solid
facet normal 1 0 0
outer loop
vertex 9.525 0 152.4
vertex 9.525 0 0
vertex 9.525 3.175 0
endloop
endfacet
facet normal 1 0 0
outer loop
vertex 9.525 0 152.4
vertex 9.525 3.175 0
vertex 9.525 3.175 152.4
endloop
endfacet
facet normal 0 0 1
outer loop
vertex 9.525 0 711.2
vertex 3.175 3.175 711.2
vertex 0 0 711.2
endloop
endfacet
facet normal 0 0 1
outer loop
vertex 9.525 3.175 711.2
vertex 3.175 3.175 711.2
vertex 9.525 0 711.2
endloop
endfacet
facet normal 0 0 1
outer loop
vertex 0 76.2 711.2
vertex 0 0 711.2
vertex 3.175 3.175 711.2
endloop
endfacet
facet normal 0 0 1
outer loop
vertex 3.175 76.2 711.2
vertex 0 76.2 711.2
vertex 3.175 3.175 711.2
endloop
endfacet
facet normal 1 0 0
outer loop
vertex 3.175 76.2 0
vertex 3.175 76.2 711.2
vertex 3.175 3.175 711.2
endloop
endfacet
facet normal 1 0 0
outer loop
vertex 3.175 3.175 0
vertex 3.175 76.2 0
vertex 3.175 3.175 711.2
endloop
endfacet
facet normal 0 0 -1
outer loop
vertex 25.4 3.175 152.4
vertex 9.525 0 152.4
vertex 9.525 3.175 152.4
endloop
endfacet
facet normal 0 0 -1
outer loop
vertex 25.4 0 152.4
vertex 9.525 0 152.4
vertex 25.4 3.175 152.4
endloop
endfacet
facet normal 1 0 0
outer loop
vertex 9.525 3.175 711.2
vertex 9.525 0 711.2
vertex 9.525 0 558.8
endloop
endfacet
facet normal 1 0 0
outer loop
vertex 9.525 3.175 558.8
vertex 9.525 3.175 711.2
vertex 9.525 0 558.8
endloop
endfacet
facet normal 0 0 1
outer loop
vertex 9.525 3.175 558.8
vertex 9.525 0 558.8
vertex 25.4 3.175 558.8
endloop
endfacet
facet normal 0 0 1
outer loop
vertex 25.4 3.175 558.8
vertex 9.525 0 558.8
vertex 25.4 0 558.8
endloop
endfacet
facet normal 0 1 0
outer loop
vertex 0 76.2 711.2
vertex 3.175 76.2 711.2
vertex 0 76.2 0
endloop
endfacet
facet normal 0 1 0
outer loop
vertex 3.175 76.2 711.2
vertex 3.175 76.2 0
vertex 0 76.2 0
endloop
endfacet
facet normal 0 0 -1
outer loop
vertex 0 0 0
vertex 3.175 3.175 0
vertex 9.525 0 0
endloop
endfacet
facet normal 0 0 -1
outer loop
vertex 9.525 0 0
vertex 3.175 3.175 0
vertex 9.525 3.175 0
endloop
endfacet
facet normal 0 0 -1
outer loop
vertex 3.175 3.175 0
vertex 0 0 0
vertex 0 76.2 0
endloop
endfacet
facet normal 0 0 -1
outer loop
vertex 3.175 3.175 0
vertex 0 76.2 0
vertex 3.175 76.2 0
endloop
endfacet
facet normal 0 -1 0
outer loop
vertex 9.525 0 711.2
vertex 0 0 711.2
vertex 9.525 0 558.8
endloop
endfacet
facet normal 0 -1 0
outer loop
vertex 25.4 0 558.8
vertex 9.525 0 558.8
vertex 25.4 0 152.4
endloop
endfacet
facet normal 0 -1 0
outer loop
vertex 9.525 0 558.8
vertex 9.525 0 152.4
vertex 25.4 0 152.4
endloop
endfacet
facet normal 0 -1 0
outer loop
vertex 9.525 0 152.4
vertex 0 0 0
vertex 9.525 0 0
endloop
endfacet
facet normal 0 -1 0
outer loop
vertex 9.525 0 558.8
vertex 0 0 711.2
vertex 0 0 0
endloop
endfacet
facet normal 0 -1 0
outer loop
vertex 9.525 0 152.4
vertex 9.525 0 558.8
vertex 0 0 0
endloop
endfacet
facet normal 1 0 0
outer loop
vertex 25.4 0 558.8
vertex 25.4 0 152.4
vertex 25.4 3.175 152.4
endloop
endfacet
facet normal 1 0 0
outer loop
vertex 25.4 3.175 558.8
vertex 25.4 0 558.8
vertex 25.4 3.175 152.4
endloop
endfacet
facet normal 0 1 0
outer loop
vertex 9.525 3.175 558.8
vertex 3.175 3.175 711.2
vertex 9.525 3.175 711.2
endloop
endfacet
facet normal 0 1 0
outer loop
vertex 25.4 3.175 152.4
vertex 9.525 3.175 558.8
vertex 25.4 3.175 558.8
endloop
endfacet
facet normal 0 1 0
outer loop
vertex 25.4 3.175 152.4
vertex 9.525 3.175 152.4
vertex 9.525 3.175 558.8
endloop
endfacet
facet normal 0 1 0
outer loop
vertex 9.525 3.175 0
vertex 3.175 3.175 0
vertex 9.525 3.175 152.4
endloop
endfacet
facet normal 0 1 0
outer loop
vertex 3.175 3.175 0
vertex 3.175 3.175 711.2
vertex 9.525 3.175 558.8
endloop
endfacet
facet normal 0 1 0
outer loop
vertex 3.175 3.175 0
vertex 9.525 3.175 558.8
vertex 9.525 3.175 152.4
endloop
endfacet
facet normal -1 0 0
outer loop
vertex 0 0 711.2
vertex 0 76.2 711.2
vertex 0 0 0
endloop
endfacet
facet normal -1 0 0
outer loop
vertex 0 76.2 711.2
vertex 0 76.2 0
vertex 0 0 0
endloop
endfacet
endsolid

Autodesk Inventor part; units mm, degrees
ref_plane "YZ Plane" through (0, 0, 0) normal (1, 0, 0) x (0, 1, 0)
ref_plane "XZ Plane" through (0, 0, 0) normal (0, 1, 0) x (-1, 0, 0)
ref_plane "XY Plane" through (0, 0, 0) normal (0, 0, 1) x (1, 0, 0)
sketch "Sketch1" plane through (0, 0, 0) normal (0, 0, 1) x (1, 0, 0)
  line L0 (0, 0) -> (25.4, 0)
  line L1 (25.4, 0) -> (25.4, 3.175)
  line L2 (3.175, 76.2) -> (0, 76.2)
  line L3 (0, 76.2) -> (0, 0)
  line L4 (3.175, 76.2) -> (3.175, 3.175)
  line L5 (3.175, 3.175) -> (25.4, 3.175)
  dimension "d0" = 76.2
  dimension "d1" = 25.4
  dimension "d2" = 3.175
  dimension "d3" = 3.175
extrude "Extrusion1" add sketch "Sketch1" along normal blind 711.2
sketch "Sketch2" plane through (0, 0, 0) normal (0, -1, 0) x (1, 0, 0)
  line L0 (0, 0) -> (0, 711.2) projected
  line L1 (25.4, 0) -> (25.4, 711.2) projected
  line L2 (0, 355.6) -> (25.4, 355.6)
  line L3 (25.4, 0) -> (9.525, 0)
  line L4 (9.525, 0) -> (9.525, 152.4)
  line L5 (9.525, 152.4) -> (25.4, 152.4)
  line L6 (25.4, 152.4) -> (25.4, 0)
  line L7 (25.4, 711.2) -> (9.525, 711.2)
  line L8 (9.525, 711.2) -> (9.525, 558.8)
  line L9 (9.525, 558.8) -> (25.4, 558.8)
  line L10 (25.4, 558.8) -> (25.4, 711.2)
  dimension "d7" = 15.875
  dimension "d8" = 152.4
extrude "Extrusion2" cut sketch "Sketch2" against normal through all
equation "\"d3\" = d2"
properties part number "frame 7 outside L"
